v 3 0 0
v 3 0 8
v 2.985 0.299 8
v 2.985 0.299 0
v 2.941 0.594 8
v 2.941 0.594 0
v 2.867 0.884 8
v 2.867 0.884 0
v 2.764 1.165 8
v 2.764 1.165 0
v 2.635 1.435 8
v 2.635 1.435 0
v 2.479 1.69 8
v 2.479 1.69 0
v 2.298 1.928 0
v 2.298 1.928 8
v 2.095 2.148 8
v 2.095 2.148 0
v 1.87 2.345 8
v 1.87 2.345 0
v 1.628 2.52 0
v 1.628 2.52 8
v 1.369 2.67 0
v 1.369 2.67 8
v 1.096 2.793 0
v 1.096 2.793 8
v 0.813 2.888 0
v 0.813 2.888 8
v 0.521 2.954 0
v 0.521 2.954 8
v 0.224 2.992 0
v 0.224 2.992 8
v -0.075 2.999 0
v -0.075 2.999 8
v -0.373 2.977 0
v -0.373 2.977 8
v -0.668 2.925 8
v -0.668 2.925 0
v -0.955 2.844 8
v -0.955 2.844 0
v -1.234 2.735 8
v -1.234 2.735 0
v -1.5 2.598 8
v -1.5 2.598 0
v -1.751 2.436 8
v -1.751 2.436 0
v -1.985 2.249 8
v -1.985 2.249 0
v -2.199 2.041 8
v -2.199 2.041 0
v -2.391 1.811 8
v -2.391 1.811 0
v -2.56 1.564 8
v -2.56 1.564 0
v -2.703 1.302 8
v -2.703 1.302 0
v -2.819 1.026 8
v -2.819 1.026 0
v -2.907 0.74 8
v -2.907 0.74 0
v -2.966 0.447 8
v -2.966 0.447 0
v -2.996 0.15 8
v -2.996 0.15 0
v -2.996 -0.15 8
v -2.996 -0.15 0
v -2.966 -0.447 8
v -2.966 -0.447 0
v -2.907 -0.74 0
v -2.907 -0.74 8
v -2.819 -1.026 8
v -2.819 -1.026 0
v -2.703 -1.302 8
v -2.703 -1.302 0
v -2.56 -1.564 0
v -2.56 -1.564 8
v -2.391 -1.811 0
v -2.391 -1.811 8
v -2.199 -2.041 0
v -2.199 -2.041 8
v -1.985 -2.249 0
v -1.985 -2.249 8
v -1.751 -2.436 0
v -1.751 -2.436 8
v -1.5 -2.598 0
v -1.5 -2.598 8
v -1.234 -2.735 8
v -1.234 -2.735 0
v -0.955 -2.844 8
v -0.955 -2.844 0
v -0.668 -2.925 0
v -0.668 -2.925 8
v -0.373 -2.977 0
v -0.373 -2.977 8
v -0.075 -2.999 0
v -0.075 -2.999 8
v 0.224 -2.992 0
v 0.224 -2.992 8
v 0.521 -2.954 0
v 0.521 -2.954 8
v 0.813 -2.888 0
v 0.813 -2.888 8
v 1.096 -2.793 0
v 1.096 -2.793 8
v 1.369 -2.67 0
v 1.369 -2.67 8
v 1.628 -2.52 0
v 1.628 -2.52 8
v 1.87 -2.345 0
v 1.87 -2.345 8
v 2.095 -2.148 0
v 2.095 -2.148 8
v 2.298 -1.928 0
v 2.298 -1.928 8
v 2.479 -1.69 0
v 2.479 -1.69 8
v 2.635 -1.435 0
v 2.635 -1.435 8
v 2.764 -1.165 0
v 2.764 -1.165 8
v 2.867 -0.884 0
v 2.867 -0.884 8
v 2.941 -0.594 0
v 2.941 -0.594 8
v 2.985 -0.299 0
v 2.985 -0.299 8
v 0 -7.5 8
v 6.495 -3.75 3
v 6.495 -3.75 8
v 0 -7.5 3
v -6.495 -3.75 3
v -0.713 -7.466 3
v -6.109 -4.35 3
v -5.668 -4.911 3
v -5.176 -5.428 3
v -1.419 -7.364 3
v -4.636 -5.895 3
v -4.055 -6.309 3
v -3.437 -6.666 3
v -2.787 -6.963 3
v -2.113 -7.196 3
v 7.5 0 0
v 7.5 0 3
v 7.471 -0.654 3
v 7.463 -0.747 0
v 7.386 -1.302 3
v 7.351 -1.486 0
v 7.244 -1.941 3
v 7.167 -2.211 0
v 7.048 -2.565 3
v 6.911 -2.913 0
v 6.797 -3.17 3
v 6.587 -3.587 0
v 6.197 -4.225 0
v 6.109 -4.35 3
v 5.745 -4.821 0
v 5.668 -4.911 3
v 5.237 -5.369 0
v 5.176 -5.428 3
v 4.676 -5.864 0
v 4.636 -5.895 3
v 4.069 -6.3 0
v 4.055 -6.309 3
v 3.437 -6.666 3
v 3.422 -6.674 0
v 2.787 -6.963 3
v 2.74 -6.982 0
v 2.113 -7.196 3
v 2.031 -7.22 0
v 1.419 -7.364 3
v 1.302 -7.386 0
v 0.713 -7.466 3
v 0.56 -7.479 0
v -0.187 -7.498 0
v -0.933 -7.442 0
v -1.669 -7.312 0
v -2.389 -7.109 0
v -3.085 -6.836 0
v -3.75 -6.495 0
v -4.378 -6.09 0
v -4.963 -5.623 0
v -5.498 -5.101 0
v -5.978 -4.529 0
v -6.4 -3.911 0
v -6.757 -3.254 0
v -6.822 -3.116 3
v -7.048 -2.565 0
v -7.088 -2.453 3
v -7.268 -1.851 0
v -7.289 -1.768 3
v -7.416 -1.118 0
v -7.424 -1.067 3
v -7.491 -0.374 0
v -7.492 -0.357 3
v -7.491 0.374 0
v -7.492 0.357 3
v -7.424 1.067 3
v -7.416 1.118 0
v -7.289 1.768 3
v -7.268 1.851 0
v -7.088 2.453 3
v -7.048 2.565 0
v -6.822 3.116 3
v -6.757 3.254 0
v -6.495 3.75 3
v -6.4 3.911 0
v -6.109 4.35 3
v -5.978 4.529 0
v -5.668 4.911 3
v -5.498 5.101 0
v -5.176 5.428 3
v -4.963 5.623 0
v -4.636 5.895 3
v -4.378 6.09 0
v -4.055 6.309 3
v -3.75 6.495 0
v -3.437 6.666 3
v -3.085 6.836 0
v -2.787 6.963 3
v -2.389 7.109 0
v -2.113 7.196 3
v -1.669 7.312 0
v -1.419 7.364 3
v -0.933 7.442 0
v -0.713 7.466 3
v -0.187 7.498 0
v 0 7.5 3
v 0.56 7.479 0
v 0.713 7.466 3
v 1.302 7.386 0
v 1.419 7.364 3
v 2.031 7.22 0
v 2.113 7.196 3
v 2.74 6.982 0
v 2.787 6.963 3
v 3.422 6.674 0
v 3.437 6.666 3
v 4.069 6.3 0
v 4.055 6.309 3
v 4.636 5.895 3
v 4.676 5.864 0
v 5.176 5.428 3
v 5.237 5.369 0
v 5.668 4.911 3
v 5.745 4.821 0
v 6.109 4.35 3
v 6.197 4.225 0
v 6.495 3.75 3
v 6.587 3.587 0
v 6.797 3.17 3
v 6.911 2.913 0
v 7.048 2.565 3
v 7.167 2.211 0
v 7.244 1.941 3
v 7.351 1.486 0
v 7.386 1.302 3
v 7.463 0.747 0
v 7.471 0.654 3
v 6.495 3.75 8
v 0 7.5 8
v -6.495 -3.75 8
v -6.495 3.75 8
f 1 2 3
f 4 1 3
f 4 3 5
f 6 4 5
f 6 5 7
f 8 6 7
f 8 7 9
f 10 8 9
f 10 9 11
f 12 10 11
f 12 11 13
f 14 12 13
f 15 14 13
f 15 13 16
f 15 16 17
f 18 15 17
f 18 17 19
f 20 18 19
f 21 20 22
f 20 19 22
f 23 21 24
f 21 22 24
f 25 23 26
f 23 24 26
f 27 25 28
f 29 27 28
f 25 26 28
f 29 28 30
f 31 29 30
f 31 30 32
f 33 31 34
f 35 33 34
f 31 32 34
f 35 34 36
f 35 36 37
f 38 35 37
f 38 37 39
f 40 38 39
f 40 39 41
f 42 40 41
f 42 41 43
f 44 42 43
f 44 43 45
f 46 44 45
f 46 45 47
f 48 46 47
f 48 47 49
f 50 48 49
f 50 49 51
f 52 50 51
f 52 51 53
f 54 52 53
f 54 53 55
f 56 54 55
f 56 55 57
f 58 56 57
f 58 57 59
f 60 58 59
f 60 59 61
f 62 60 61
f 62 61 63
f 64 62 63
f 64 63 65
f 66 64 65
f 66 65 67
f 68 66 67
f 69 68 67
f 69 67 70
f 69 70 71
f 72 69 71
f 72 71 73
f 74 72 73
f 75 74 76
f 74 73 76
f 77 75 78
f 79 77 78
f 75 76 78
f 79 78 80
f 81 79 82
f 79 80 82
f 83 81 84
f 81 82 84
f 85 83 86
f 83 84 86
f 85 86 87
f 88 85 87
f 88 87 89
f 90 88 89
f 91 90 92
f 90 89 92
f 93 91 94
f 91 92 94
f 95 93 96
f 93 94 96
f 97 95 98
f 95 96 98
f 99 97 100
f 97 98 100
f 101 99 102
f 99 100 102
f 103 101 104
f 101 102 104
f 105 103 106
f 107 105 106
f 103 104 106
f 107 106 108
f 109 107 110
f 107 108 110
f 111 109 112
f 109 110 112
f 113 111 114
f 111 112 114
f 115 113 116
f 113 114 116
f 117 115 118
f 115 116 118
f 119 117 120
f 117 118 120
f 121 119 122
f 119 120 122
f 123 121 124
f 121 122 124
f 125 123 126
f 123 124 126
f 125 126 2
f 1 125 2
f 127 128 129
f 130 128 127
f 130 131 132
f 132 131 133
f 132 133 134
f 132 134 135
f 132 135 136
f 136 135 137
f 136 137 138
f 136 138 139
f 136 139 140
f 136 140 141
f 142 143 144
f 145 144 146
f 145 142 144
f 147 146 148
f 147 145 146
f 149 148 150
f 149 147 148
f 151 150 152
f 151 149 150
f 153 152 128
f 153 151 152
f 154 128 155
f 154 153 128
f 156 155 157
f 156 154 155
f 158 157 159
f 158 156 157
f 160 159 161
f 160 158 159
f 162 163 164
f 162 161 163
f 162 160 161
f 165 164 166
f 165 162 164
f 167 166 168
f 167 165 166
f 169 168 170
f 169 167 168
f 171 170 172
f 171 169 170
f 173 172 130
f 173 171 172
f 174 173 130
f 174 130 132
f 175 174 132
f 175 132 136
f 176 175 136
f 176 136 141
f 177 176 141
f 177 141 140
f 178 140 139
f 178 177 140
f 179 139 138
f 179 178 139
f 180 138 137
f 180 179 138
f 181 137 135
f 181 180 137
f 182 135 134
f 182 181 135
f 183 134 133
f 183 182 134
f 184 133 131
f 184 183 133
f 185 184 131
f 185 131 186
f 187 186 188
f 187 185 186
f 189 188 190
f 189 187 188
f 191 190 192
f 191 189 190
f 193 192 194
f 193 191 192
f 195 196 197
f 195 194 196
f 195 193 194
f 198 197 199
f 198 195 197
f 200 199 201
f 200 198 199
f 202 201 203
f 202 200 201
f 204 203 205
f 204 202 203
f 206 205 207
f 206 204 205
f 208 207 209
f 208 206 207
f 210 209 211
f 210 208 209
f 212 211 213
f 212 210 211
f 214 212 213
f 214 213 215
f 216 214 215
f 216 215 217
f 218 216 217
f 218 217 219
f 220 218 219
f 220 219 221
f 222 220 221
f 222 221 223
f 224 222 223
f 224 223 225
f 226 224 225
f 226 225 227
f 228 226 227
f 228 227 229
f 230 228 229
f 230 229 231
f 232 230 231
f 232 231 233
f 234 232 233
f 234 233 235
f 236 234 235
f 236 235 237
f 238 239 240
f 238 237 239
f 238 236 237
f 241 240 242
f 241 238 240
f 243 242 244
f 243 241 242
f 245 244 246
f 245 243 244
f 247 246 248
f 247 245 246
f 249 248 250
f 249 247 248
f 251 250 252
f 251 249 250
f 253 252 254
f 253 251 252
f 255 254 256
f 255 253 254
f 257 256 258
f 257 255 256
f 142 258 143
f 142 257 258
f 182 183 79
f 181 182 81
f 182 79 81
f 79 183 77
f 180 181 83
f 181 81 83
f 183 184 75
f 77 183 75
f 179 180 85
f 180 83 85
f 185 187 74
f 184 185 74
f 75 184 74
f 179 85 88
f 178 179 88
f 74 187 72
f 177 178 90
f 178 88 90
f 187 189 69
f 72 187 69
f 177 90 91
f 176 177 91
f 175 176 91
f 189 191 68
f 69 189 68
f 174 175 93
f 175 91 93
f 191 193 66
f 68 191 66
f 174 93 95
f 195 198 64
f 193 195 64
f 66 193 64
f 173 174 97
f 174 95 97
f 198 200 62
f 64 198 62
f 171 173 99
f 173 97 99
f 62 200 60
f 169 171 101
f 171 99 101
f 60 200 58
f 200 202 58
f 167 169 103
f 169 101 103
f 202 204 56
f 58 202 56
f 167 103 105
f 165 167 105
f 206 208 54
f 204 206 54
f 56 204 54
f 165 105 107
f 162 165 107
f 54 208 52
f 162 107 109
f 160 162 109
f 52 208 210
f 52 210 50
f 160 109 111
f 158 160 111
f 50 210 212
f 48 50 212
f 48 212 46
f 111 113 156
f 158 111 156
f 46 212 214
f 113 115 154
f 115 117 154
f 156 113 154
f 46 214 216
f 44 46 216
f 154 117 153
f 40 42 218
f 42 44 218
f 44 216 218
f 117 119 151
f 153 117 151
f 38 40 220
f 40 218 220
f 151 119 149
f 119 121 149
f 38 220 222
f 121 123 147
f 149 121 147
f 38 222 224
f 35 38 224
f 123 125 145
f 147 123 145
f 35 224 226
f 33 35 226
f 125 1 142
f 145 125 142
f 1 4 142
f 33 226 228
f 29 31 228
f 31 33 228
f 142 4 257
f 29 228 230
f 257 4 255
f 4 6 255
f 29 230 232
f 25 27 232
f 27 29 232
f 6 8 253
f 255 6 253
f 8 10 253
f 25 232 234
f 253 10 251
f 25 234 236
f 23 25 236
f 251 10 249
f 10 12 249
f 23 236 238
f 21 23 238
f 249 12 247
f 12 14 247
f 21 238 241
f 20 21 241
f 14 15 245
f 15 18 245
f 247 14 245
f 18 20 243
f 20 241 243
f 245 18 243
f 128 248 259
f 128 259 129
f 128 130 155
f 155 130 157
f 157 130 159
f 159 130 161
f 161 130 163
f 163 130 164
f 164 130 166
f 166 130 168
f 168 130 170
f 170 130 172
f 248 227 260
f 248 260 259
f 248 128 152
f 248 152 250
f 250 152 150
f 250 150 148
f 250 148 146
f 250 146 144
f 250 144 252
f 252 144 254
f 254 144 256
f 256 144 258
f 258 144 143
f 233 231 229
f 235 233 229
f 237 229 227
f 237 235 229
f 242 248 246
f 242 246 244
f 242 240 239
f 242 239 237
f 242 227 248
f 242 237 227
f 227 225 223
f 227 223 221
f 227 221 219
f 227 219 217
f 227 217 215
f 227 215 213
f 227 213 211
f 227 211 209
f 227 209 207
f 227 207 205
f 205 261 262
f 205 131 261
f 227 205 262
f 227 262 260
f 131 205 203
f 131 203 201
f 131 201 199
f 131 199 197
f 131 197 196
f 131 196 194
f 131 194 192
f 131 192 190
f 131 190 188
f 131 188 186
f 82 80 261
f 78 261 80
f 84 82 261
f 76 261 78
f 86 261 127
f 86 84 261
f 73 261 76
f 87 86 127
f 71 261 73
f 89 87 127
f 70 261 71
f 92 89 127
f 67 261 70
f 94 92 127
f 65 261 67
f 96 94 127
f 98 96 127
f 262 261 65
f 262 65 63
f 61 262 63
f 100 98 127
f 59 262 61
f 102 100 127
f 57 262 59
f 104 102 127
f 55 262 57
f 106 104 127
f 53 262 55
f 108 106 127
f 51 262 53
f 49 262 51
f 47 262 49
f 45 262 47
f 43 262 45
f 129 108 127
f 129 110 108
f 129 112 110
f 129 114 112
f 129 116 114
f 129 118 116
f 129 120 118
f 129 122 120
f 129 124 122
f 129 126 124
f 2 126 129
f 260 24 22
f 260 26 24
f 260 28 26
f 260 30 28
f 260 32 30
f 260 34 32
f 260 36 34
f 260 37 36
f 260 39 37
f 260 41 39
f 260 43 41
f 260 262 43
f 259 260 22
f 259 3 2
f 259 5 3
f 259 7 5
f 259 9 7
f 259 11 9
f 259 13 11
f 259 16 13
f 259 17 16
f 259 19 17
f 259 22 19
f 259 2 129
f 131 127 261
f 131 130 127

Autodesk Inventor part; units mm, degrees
ref_plane "YZ Plane" through (0, 0, 0) normal (1, 0, 0) x (0, 1, 0)
ref_plane "XZ Plane" through (0, 0, 0) normal (0, 1, 0) x (-1, 0, 0)
ref_plane "XY Plane" through (0, 0, 0) normal (0, 0, 1) x (1, 0, 0)
sketch "スケッチ1" plane through (0, 0, 0) normal (0, 0, 1) x (1, 0, 0)
  circle A0 centre (0, 0) radius 7.5
  dimension "d0" = 15
extrude "押し出し1" add sketch "スケッチ1" along normal blind 3
sketch "スケッチ2" plane through (0, 0, 3) normal (0, 0, 1) x (1, 0, 0)
  line L0 (0, 7.5) -> (6.4952, 3.75)
  line L1 (6.4952, 3.75) -> (6.4952, -3.75)
  line L2 (6.4952, -3.75) -> (0, -7.5)
  line L3 (0, -7.5) -> (-6.4952, -3.75)
  line L4 (-6.4952, -3.75) -> (-6.4952, 3.75)
  line L5 (-6.4952, 3.75) -> (0, 7.5)
  point P0 (0, 0)
  point P1 (0, 0)
  dimension "d8" = 7.5
extrude "押し出し2" add sketch "スケッチ2" along normal blind 5
sketch "スケッチ3" plane through (0, 0, 8) normal (0, 0, 1) x (1, 0, 0)
  circle A0 centre (0, 0) radius 3
  dimension "d5" = 6
extrude "押し出し3" cut sketch "スケッチ3" against normal blind 30
properties part number "頭ねじ" material "アルミニウム"
